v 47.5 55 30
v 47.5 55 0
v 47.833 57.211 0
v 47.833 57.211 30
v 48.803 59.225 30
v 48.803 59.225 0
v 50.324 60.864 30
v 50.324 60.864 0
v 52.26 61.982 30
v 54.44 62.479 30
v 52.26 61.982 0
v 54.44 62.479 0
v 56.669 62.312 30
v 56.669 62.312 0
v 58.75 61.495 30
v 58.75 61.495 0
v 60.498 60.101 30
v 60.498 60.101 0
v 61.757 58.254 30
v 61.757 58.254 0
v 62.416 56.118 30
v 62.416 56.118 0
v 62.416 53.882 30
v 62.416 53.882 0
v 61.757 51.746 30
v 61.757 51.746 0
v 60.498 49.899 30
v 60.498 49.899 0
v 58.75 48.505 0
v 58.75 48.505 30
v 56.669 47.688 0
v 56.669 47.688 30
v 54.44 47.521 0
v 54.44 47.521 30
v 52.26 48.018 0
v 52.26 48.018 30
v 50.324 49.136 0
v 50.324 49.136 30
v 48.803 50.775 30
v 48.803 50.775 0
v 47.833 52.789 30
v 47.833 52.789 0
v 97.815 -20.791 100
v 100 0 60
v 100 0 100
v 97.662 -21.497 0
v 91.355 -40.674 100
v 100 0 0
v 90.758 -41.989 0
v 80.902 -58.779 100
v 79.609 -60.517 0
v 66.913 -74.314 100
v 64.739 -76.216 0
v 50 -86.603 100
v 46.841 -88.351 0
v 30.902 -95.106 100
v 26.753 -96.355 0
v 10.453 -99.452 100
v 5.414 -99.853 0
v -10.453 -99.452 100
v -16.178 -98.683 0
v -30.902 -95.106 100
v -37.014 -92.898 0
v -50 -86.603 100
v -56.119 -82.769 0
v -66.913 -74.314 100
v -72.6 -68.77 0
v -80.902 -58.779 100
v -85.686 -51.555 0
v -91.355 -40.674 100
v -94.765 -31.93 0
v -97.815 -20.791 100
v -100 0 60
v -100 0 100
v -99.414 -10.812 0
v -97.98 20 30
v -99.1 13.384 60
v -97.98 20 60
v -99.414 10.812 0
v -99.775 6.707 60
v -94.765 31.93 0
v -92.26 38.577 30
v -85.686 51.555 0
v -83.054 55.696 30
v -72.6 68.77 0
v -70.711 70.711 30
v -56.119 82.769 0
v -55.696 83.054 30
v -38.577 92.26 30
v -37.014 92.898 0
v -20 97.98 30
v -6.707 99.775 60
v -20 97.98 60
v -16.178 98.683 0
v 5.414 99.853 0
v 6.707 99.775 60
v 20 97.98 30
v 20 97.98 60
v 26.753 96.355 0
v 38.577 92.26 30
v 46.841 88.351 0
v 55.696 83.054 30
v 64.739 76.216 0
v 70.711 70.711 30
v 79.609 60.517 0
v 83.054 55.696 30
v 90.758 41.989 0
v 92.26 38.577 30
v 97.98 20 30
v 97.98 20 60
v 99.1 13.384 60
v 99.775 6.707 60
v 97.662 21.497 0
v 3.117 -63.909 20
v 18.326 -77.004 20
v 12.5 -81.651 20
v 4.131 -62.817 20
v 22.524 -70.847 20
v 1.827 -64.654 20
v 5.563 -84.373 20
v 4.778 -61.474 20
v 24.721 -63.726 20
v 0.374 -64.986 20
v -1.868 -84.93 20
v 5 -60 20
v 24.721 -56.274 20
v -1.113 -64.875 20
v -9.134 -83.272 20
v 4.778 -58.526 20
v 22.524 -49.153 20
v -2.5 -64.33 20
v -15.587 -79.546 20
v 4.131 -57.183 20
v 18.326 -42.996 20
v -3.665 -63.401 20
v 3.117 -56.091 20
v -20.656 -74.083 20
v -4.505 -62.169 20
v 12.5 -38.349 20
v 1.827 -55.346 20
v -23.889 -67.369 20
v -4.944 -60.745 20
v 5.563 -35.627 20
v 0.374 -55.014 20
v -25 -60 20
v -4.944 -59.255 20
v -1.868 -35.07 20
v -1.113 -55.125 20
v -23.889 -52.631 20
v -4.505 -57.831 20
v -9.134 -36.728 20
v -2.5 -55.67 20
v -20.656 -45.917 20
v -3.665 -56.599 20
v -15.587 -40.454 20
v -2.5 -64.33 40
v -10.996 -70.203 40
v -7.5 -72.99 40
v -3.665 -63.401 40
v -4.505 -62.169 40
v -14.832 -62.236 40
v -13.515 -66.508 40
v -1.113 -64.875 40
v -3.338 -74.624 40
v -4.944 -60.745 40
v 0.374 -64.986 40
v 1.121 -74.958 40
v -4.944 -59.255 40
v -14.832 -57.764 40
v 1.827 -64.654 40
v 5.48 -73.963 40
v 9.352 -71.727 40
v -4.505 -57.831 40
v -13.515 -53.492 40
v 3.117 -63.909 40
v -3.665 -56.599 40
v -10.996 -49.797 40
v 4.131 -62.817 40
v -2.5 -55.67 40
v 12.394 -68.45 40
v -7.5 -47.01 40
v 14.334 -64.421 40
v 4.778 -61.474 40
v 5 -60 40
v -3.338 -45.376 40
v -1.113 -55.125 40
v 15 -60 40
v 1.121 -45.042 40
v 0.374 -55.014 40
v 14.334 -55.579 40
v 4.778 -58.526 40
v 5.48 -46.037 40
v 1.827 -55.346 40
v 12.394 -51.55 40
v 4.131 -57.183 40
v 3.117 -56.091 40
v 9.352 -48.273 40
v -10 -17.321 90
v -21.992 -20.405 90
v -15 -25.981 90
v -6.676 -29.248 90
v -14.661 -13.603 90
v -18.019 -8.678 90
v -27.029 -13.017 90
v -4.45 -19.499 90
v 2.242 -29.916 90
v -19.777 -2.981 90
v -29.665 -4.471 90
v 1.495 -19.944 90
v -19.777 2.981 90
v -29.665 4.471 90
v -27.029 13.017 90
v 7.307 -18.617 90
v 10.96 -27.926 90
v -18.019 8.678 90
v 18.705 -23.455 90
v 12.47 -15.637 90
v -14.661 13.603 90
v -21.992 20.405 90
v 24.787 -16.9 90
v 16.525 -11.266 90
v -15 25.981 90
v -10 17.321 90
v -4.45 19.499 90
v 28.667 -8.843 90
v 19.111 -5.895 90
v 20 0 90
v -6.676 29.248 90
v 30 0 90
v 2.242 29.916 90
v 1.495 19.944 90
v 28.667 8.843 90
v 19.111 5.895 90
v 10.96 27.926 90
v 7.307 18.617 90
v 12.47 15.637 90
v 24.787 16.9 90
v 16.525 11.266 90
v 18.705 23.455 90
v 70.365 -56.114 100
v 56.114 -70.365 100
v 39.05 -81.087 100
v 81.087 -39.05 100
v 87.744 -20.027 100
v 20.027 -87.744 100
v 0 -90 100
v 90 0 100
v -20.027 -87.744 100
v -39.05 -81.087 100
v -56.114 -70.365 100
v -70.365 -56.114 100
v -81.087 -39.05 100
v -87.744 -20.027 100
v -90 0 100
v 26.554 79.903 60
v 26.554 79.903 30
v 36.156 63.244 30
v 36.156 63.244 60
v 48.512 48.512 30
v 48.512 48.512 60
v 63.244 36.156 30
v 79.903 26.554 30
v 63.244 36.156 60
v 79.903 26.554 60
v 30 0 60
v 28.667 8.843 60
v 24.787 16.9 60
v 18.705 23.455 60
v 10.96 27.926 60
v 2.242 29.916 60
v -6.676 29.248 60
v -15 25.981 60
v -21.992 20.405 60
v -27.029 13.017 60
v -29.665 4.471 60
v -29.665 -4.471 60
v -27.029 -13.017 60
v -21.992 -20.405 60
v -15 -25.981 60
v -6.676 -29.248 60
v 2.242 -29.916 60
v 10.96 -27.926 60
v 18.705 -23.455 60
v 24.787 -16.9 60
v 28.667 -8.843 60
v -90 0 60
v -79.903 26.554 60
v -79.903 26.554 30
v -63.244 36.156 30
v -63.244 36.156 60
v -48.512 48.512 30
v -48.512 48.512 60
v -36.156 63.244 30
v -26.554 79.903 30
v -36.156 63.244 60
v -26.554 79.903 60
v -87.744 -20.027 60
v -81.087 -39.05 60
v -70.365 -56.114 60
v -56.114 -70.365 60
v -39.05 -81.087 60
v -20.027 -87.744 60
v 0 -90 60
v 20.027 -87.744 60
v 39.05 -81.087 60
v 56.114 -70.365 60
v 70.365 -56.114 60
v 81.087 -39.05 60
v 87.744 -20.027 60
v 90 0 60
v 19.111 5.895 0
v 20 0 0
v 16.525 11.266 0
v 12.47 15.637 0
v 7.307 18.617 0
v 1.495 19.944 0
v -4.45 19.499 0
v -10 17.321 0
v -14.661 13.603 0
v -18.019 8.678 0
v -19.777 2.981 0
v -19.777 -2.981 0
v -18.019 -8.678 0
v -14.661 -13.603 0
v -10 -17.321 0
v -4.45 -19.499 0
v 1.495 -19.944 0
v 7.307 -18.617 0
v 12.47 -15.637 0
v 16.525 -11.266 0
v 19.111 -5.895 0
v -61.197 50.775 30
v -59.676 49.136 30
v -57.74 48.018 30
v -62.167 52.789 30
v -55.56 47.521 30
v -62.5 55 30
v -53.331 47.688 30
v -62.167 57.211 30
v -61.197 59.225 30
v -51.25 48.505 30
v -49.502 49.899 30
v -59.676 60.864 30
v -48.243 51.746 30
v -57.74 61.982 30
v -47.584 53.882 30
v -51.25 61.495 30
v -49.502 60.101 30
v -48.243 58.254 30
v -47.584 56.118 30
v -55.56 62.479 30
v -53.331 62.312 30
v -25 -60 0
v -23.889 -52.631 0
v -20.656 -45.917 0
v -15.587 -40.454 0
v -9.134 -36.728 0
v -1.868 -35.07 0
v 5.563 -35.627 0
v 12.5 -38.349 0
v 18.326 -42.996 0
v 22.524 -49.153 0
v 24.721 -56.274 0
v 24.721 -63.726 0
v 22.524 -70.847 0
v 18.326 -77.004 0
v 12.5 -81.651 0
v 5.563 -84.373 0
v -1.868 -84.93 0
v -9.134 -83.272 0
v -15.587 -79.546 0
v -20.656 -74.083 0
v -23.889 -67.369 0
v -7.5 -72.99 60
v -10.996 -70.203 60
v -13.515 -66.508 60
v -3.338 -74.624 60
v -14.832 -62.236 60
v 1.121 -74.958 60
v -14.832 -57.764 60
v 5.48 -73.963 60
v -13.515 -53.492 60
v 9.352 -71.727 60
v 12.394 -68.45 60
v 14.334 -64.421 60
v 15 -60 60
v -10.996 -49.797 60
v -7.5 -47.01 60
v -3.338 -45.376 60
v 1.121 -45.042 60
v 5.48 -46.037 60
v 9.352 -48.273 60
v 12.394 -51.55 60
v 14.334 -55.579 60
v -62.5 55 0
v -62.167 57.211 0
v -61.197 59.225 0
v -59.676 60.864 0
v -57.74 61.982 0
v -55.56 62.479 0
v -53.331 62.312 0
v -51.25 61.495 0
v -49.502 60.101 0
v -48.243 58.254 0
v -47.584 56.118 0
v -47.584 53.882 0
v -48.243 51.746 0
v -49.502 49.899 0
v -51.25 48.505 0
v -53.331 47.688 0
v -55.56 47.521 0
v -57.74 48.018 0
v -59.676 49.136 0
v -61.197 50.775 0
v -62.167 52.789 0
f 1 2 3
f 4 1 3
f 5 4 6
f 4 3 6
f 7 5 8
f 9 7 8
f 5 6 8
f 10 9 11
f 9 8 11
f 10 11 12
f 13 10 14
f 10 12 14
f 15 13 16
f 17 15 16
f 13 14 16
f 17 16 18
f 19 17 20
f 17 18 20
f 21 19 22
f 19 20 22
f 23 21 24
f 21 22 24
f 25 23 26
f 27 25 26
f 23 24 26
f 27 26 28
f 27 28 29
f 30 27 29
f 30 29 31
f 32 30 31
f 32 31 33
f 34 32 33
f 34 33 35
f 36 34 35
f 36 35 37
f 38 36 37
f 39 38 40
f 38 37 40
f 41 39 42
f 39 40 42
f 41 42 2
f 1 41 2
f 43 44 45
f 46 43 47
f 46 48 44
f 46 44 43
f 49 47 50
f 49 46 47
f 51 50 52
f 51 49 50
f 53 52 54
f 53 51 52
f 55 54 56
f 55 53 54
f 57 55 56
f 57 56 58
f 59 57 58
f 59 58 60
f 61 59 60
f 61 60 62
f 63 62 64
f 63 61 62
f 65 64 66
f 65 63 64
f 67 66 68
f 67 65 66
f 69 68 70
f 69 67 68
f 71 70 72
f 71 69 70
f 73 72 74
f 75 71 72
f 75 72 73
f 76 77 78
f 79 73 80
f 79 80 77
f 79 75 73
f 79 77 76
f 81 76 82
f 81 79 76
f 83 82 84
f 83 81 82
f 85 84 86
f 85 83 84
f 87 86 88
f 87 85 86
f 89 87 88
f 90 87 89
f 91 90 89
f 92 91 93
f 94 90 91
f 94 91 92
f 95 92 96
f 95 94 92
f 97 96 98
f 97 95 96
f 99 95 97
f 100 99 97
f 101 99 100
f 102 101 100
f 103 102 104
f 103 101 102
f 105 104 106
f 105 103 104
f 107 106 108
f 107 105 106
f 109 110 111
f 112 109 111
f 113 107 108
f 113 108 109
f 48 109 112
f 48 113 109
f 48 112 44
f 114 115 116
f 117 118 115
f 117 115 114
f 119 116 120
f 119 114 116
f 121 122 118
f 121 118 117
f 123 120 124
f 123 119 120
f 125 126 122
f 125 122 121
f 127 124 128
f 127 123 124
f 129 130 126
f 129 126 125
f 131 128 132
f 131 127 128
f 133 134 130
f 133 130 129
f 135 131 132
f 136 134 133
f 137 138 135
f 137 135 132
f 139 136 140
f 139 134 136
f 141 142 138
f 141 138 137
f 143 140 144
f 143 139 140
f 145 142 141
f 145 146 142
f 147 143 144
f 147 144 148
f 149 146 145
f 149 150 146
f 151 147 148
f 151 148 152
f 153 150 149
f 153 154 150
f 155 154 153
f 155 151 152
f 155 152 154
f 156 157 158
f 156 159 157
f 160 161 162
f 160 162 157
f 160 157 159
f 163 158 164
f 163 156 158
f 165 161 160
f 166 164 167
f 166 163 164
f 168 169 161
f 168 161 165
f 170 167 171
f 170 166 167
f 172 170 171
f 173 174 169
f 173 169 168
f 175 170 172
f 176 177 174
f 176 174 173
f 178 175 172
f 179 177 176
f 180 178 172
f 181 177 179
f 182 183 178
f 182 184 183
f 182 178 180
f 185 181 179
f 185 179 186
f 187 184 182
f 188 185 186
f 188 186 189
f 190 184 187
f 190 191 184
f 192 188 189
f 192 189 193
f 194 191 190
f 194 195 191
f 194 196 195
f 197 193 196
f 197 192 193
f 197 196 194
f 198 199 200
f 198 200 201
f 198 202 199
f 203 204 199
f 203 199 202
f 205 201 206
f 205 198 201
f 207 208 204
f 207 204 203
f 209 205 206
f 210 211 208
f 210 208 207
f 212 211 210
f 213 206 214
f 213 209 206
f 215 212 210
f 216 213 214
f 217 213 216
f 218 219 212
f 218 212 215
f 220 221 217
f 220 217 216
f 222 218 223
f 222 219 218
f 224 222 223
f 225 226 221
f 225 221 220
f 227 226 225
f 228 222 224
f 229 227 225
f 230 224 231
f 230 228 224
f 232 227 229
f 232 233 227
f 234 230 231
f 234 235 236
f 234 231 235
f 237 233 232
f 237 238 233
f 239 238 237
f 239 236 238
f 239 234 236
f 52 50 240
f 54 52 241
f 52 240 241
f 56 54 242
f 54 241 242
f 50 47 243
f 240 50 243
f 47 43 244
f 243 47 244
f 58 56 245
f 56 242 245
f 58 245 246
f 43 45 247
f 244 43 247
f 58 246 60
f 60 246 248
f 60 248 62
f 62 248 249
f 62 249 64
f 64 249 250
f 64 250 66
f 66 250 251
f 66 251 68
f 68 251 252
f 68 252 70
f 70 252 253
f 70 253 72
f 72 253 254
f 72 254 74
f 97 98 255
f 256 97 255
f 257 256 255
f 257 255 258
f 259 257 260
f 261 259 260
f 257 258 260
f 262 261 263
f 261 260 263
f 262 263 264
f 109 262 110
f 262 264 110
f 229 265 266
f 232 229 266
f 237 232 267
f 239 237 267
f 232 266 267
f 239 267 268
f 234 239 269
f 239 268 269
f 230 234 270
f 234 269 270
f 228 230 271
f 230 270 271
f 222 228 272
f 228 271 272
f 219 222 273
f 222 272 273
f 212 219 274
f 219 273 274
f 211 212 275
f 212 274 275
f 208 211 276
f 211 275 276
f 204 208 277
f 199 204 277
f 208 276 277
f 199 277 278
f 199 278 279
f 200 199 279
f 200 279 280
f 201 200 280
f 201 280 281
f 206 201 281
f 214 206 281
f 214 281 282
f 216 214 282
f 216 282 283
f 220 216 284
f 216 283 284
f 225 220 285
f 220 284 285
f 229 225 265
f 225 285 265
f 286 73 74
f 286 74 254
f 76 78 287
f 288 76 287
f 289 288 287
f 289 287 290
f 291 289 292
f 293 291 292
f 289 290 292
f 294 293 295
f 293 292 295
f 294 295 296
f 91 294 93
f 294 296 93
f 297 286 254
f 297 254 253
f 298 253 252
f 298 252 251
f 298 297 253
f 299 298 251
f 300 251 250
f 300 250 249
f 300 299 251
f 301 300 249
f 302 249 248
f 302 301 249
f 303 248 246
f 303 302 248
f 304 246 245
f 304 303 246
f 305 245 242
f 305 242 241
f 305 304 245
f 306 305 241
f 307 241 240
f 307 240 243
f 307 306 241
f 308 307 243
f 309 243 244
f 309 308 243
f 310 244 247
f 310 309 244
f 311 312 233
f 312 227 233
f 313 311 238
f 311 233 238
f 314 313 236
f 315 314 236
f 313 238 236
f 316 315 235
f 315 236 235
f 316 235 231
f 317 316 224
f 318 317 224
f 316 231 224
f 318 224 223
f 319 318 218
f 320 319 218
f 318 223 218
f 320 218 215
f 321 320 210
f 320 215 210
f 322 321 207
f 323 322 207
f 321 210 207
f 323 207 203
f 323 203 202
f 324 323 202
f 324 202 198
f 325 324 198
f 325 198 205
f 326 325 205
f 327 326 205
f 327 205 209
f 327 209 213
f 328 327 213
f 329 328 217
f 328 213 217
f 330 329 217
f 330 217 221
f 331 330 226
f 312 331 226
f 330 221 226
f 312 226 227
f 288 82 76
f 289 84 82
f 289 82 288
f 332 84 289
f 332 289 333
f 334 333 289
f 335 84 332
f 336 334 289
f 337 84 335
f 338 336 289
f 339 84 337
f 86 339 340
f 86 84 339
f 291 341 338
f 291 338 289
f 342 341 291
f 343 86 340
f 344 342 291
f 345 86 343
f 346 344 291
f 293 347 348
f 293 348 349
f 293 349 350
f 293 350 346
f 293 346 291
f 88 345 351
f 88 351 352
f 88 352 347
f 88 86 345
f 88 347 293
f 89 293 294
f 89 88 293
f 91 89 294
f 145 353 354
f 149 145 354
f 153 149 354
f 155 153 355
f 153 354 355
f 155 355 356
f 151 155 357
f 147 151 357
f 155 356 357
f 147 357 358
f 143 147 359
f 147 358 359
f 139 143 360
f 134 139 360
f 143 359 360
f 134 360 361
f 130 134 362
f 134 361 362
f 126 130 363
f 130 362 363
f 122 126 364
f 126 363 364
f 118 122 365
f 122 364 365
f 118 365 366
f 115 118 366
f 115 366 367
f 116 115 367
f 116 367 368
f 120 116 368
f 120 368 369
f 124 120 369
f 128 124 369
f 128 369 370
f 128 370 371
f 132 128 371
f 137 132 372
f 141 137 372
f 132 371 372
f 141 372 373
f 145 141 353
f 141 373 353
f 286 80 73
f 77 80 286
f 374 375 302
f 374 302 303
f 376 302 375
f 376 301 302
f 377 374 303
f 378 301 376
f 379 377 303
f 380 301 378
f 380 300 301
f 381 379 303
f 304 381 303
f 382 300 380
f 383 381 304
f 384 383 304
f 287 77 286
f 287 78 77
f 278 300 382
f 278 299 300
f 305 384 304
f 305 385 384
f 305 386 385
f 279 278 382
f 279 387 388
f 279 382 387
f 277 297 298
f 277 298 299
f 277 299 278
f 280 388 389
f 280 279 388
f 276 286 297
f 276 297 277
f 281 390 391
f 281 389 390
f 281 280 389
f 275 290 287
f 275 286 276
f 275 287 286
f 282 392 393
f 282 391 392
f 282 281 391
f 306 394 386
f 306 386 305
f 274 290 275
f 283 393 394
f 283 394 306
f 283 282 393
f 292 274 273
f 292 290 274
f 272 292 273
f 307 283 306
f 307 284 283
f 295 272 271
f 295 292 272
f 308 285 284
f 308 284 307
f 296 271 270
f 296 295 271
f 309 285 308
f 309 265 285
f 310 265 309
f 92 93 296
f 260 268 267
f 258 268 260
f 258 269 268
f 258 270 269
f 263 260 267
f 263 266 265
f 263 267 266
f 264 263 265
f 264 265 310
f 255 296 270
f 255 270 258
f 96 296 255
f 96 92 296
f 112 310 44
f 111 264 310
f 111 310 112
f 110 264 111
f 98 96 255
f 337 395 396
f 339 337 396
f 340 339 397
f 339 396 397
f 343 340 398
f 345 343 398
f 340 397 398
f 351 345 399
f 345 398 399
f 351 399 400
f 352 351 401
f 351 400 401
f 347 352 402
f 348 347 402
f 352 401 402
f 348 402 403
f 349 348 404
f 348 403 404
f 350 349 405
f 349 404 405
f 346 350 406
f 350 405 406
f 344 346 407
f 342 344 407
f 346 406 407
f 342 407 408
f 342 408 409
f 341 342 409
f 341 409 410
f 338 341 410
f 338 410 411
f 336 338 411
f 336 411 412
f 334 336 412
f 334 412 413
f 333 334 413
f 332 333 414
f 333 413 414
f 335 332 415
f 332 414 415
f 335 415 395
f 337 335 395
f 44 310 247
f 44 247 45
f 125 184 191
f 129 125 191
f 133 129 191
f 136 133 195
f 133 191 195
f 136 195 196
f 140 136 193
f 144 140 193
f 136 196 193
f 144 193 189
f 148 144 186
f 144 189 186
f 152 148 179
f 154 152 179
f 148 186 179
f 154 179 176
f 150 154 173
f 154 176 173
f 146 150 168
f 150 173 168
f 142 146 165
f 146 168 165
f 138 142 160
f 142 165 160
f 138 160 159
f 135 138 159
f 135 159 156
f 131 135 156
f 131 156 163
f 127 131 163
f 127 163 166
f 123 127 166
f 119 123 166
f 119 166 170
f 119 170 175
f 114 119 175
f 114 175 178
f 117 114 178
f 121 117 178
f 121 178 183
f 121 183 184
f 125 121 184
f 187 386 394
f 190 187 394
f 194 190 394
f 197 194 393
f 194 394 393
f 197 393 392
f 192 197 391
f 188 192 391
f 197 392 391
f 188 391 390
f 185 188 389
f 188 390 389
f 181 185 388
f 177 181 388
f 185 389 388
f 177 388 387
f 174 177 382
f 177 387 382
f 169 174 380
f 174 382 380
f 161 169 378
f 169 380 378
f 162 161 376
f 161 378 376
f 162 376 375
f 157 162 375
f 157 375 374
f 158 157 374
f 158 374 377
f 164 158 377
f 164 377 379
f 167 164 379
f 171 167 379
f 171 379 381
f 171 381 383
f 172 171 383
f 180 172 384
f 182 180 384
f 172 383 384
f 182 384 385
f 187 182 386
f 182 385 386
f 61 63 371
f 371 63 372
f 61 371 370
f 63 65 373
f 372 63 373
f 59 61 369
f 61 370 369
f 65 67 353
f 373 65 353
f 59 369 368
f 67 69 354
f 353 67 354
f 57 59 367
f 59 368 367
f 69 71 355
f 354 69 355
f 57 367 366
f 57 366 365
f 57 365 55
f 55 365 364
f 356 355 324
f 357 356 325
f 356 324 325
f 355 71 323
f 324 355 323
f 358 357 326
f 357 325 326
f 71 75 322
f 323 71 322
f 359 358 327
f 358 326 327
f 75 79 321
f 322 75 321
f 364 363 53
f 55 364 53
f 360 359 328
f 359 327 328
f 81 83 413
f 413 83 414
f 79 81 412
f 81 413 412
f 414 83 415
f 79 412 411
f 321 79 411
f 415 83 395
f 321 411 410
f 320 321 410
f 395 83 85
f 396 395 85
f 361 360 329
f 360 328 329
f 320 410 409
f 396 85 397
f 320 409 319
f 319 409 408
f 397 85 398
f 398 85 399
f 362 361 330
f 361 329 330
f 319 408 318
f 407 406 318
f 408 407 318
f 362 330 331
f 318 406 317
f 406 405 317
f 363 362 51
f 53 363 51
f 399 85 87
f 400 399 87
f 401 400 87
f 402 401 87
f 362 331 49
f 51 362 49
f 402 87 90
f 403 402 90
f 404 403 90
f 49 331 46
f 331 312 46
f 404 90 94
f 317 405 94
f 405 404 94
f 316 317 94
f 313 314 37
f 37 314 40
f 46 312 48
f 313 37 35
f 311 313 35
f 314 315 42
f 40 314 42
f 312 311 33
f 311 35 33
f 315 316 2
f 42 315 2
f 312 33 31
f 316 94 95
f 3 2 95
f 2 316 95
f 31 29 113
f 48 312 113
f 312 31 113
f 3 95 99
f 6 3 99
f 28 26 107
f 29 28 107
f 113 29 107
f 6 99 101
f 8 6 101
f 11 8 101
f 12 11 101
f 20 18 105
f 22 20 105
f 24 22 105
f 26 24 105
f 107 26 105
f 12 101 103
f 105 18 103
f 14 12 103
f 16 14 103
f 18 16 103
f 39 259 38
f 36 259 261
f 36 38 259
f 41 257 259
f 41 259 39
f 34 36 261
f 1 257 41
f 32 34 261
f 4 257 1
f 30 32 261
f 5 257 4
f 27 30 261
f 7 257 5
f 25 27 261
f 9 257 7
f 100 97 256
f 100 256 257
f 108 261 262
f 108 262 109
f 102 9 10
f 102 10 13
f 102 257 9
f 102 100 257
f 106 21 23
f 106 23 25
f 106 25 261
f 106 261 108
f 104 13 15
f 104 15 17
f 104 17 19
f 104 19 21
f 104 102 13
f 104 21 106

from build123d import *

# Parameters (mm, degrees)
SKETCH1_R           = 100
BOSS_EXTRUDE1_DEPTH = 100
SKETCH3_R           = 7.5
CUT_EXTRUDE2_DEPTH  = 30
CUT_EXTRUDE3_DEPTH  = 70
SKETCH5_W           = 200
SKETCH5_H           = 200
CUT_EXTRUDE4_DEPTH  = 70
BOSS_EXTRUDE2_DEPTH = 40
SKETCH7_R           = 15
CUT_EXTRUDE5_DEPTH  = 20
SKETCH8_R           = 5
CUT_EXTRUDE6_DEPTH  = 89
SKETCH9_R           = 25
CUT_EXTRUDE7_DEPTH  = 20
SKETCH10_R          = 30
BOSS_EXTRUDE4_DEPTH = 30
SKETCH12_R          = 20
CUT_EXTRUDE9_DEPTH  = 50
SKETCH13_R          = 20
CUT_EXTRUDE10_DEPTH = 50


with BuildPart() as part:
    # Sketch1 → Boss-Extrude1 (new body)
    with BuildSketch(Plane.XY):
        Circle(SKETCH1_R)
    extrude(amount=BOSS_EXTRUDE1_DEPTH)

    # Sketch3 → Cut-Extrude2 (cut)
    with BuildSketch(Plane(origin=(0, 0, 0), x_dir=(-1, 0, 0), z_dir=(0, 0, -1))):
        with Locations((-55, 55)):
            Circle(SKETCH3_R)
        with Locations((55, 55)):
            Circle(SKETCH3_R)
    extrude(amount=-CUT_EXTRUDE2_DEPTH, mode=Mode.SUBTRACT)

    # Sketch4 → Cut-Extrude3 (cut)
    with BuildSketch(Plane.XY.offset(100)):
        with BuildLine():
            ThreePointArc((-97.979589711, 20), (-48.511807343, 48.511807343), (-20, 97.979589711))
            ThreePointArc((-20, 97.979589711), (-70.710678119, 70.710678119), (-97.979589711, 20))
        make_face()
        with BuildLine():
            ThreePointArc((97.979589711, 20), (70.710678119, 70.710678119), (20, 97.979589711))
            ThreePointArc((20, 97.979589711), (48.511807343, 48.511807343), (97.979589711, 20))
        make_face()
    extrude(amount=-CUT_EXTRUDE3_DEPTH, mode=Mode.SUBTRACT)

    # Sketch5 → Cut-Extrude4 (cut)
    with BuildSketch(Plane.XY.offset(60)):
        Rectangle(SKETCH5_W, SKETCH5_H)
    extrude(amount=CUT_EXTRUDE4_DEPTH, mode=Mode.SUBTRACT)

    # Sketch6 → Boss-Extrude2 (add)
    with BuildSketch(Plane.XY.offset(60)):
        with BuildLine():
            Line((-100, 0), (-90, 0))
            ThreePointArc((-90, 0), (0, -90), (90, 0))
            Line((90, 0), (100, 0))
            ThreePointArc((100, 0), (0, -100), (-100, 0))
        make_face()
    extrude(amount=BOSS_EXTRUDE2_DEPTH)

    # Sketch7 → Cut-Extrude5 (cut)
    with BuildSketch(Plane.XY.offset(60)):
        with Locations((0, -60)):
            Circle(SKETCH7_R)
    extrude(amount=-CUT_EXTRUDE5_DEPTH, mode=Mode.SUBTRACT)

    # Sketch8 → Cut-Extrude6 (cut)
    with BuildSketch(Plane.XY.offset(40)):
        with Locations((0, -60)):
            Circle(SKETCH8_R)
    extrude(amount=-CUT_EXTRUDE6_DEPTH, mode=Mode.SUBTRACT)

    # Sketch9 → Cut-Extrude7 (cut)
    with BuildSketch(Plane(origin=(0, 0, 0), x_dir=(-1, 0, 0), z_dir=(0, 0, -1))):
        with Locations((0, -60)):
            Circle(SKETCH9_R)
    extrude(amount=-CUT_EXTRUDE7_DEPTH, mode=Mode.SUBTRACT)

    # Sketch10 → Boss-Extrude4 (add)
    with BuildSketch(Plane.XY.offset(60)):
        Circle(SKETCH10_R)
    extrude(amount=BOSS_EXTRUDE4_DEPTH)

    # Sketch12 → Cut-Extrude9 (cut)
    with BuildSketch(Plane.XY.offset(90)):
        Circle(SKETCH12_R)
    extrude(amount=-CUT_EXTRUDE9_DEPTH, mode=Mode.SUBTRACT)

    # Sketch13 → Cut-Extrude10 (cut)
    with BuildSketch(Plane.XY.offset(40)):
        Circle(SKETCH13_R)
    extrude(amount=-CUT_EXTRUDE10_DEPTH, mode=Mode.SUBTRACT)


solid = part.part
